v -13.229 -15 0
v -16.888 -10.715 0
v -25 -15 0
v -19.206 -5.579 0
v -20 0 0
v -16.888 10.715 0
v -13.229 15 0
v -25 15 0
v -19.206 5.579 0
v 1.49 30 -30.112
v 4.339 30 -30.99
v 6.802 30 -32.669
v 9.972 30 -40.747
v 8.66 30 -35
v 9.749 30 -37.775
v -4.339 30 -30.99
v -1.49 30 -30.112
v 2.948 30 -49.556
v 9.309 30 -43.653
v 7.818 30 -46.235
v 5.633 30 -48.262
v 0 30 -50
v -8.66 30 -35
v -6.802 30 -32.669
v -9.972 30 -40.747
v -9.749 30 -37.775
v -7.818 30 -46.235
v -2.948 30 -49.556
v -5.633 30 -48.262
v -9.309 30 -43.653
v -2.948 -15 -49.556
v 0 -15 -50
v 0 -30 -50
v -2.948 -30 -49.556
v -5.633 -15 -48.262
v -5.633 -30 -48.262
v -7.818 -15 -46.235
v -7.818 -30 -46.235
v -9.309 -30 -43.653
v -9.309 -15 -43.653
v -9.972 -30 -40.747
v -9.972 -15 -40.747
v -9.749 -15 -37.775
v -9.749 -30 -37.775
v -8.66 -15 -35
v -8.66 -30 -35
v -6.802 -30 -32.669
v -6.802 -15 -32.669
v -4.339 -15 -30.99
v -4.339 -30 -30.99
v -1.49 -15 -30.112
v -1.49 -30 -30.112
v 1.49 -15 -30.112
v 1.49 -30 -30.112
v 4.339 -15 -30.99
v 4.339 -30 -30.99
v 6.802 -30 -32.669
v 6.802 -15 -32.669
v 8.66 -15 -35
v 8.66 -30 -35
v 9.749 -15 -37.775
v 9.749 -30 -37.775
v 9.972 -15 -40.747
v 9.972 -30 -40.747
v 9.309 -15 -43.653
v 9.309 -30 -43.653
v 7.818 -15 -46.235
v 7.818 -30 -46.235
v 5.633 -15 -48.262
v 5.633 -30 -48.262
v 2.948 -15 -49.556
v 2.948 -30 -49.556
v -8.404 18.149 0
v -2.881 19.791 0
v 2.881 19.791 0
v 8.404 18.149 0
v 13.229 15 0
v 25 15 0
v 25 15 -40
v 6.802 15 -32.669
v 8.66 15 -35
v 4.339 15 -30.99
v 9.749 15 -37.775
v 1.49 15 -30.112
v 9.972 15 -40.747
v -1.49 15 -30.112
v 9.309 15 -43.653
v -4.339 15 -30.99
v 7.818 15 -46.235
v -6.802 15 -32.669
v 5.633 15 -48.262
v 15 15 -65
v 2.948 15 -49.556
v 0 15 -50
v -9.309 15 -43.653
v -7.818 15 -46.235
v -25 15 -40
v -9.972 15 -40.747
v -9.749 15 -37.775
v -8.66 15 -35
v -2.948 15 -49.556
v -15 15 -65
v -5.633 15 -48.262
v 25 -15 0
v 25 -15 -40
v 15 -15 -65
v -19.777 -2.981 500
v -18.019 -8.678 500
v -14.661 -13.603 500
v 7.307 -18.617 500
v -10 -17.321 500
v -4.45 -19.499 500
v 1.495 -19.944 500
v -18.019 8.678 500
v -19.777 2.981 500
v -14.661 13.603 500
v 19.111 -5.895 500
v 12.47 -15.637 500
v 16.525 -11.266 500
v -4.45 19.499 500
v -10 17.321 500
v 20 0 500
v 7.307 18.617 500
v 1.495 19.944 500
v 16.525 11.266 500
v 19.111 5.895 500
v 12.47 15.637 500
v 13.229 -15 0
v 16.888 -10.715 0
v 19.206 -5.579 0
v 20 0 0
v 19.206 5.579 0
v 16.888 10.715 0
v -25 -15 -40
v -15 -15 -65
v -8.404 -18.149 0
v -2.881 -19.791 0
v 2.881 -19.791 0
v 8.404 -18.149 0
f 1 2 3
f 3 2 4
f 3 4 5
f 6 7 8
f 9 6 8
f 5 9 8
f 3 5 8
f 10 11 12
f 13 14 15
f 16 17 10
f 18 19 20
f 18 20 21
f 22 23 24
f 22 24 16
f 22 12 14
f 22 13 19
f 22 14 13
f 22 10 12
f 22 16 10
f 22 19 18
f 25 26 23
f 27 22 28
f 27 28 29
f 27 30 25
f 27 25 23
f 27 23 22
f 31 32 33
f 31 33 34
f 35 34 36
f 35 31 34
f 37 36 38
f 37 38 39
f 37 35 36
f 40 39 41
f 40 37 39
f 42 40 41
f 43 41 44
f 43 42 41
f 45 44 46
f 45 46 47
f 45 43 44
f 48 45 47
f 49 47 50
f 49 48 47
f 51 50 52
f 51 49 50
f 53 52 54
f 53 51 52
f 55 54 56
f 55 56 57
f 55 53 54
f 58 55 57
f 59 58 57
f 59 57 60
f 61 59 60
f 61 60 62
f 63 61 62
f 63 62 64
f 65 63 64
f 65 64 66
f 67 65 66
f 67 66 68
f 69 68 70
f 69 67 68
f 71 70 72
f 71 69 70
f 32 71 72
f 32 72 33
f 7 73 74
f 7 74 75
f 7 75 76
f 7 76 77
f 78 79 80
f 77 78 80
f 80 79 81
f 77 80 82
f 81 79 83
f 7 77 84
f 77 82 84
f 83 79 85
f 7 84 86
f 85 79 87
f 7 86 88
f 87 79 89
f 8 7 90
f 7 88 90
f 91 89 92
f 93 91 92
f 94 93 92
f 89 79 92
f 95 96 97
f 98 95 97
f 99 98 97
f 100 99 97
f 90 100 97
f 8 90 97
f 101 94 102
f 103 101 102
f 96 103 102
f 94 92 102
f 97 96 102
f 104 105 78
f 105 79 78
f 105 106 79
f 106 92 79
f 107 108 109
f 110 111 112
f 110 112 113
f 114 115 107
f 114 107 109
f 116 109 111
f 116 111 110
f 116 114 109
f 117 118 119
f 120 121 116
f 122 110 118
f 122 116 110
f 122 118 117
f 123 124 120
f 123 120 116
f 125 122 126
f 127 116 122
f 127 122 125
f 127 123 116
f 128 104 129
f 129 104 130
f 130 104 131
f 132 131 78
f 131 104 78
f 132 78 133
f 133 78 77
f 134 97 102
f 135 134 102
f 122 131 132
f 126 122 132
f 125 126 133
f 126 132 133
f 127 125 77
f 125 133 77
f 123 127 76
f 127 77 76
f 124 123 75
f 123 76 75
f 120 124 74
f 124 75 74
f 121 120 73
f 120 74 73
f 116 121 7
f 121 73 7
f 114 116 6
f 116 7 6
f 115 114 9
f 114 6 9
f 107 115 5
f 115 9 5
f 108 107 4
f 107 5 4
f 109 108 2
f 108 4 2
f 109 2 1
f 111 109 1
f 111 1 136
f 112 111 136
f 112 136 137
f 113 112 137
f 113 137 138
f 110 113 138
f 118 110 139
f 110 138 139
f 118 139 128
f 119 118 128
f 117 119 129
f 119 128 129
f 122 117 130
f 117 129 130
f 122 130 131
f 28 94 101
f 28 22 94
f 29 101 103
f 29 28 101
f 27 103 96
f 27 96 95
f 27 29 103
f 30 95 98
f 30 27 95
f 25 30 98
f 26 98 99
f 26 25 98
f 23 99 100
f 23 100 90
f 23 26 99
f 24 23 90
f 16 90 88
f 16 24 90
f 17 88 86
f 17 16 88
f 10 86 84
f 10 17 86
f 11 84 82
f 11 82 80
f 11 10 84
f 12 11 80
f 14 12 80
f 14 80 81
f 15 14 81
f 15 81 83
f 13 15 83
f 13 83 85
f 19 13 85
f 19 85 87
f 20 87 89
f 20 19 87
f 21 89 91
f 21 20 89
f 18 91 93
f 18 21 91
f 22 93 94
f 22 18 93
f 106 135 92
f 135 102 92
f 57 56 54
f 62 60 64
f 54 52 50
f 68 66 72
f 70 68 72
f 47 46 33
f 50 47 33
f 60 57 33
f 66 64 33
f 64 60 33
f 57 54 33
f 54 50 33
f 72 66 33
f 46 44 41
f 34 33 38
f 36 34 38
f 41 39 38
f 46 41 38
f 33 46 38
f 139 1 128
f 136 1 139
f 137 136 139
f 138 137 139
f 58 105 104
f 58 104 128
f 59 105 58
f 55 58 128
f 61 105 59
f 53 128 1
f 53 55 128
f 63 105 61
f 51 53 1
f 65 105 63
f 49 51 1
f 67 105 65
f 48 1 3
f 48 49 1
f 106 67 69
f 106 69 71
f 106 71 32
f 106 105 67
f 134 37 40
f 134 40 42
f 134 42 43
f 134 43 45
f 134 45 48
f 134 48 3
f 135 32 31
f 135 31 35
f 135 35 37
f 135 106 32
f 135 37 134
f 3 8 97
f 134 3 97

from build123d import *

# Parameters (mm, degrees)
SKETCH1_R           = 20
BOSS_EXTRUDE1_DEPTH = 500
BOSS_EXTRUDE2_DEPTH = 15
SKETCH4_R           = 10
BOSS_EXTRUDE3_DEPTH = 30


with BuildPart() as part:
    # Sketch1 → Boss-Extrude1 (new body)
    with BuildSketch(Plane.XY):
        Circle(SKETCH1_R)
    extrude(amount=BOSS_EXTRUDE1_DEPTH)

    # Sketch2 → Boss-Extrude2 (add, symmetric)
    with BuildSketch(Plane(origin=(0, 0, 0), x_dir=(1, 0, 0), z_dir=(0, 1, 0))):
        Polygon((-25, 40), (-15, 65), (15, 65), (25, 40), (25, 0), (-25, 0), align=None)
    extrude(amount=BOSS_EXTRUDE2_DEPTH, both=True)

    # Sketch4 → Boss-Extrude3 (add, symmetric)
    with BuildSketch(Plane(origin=(0, 0, 0), x_dir=(1, 0, 0), z_dir=(0, 1, 0))):
        with Locations(Location((0, 40, 0), (0, 0, 90))):
            Circle(SKETCH4_R)
    extrude(amount=BOSS_EXTRUDE3_DEPTH, both=True)


solid = part.part
